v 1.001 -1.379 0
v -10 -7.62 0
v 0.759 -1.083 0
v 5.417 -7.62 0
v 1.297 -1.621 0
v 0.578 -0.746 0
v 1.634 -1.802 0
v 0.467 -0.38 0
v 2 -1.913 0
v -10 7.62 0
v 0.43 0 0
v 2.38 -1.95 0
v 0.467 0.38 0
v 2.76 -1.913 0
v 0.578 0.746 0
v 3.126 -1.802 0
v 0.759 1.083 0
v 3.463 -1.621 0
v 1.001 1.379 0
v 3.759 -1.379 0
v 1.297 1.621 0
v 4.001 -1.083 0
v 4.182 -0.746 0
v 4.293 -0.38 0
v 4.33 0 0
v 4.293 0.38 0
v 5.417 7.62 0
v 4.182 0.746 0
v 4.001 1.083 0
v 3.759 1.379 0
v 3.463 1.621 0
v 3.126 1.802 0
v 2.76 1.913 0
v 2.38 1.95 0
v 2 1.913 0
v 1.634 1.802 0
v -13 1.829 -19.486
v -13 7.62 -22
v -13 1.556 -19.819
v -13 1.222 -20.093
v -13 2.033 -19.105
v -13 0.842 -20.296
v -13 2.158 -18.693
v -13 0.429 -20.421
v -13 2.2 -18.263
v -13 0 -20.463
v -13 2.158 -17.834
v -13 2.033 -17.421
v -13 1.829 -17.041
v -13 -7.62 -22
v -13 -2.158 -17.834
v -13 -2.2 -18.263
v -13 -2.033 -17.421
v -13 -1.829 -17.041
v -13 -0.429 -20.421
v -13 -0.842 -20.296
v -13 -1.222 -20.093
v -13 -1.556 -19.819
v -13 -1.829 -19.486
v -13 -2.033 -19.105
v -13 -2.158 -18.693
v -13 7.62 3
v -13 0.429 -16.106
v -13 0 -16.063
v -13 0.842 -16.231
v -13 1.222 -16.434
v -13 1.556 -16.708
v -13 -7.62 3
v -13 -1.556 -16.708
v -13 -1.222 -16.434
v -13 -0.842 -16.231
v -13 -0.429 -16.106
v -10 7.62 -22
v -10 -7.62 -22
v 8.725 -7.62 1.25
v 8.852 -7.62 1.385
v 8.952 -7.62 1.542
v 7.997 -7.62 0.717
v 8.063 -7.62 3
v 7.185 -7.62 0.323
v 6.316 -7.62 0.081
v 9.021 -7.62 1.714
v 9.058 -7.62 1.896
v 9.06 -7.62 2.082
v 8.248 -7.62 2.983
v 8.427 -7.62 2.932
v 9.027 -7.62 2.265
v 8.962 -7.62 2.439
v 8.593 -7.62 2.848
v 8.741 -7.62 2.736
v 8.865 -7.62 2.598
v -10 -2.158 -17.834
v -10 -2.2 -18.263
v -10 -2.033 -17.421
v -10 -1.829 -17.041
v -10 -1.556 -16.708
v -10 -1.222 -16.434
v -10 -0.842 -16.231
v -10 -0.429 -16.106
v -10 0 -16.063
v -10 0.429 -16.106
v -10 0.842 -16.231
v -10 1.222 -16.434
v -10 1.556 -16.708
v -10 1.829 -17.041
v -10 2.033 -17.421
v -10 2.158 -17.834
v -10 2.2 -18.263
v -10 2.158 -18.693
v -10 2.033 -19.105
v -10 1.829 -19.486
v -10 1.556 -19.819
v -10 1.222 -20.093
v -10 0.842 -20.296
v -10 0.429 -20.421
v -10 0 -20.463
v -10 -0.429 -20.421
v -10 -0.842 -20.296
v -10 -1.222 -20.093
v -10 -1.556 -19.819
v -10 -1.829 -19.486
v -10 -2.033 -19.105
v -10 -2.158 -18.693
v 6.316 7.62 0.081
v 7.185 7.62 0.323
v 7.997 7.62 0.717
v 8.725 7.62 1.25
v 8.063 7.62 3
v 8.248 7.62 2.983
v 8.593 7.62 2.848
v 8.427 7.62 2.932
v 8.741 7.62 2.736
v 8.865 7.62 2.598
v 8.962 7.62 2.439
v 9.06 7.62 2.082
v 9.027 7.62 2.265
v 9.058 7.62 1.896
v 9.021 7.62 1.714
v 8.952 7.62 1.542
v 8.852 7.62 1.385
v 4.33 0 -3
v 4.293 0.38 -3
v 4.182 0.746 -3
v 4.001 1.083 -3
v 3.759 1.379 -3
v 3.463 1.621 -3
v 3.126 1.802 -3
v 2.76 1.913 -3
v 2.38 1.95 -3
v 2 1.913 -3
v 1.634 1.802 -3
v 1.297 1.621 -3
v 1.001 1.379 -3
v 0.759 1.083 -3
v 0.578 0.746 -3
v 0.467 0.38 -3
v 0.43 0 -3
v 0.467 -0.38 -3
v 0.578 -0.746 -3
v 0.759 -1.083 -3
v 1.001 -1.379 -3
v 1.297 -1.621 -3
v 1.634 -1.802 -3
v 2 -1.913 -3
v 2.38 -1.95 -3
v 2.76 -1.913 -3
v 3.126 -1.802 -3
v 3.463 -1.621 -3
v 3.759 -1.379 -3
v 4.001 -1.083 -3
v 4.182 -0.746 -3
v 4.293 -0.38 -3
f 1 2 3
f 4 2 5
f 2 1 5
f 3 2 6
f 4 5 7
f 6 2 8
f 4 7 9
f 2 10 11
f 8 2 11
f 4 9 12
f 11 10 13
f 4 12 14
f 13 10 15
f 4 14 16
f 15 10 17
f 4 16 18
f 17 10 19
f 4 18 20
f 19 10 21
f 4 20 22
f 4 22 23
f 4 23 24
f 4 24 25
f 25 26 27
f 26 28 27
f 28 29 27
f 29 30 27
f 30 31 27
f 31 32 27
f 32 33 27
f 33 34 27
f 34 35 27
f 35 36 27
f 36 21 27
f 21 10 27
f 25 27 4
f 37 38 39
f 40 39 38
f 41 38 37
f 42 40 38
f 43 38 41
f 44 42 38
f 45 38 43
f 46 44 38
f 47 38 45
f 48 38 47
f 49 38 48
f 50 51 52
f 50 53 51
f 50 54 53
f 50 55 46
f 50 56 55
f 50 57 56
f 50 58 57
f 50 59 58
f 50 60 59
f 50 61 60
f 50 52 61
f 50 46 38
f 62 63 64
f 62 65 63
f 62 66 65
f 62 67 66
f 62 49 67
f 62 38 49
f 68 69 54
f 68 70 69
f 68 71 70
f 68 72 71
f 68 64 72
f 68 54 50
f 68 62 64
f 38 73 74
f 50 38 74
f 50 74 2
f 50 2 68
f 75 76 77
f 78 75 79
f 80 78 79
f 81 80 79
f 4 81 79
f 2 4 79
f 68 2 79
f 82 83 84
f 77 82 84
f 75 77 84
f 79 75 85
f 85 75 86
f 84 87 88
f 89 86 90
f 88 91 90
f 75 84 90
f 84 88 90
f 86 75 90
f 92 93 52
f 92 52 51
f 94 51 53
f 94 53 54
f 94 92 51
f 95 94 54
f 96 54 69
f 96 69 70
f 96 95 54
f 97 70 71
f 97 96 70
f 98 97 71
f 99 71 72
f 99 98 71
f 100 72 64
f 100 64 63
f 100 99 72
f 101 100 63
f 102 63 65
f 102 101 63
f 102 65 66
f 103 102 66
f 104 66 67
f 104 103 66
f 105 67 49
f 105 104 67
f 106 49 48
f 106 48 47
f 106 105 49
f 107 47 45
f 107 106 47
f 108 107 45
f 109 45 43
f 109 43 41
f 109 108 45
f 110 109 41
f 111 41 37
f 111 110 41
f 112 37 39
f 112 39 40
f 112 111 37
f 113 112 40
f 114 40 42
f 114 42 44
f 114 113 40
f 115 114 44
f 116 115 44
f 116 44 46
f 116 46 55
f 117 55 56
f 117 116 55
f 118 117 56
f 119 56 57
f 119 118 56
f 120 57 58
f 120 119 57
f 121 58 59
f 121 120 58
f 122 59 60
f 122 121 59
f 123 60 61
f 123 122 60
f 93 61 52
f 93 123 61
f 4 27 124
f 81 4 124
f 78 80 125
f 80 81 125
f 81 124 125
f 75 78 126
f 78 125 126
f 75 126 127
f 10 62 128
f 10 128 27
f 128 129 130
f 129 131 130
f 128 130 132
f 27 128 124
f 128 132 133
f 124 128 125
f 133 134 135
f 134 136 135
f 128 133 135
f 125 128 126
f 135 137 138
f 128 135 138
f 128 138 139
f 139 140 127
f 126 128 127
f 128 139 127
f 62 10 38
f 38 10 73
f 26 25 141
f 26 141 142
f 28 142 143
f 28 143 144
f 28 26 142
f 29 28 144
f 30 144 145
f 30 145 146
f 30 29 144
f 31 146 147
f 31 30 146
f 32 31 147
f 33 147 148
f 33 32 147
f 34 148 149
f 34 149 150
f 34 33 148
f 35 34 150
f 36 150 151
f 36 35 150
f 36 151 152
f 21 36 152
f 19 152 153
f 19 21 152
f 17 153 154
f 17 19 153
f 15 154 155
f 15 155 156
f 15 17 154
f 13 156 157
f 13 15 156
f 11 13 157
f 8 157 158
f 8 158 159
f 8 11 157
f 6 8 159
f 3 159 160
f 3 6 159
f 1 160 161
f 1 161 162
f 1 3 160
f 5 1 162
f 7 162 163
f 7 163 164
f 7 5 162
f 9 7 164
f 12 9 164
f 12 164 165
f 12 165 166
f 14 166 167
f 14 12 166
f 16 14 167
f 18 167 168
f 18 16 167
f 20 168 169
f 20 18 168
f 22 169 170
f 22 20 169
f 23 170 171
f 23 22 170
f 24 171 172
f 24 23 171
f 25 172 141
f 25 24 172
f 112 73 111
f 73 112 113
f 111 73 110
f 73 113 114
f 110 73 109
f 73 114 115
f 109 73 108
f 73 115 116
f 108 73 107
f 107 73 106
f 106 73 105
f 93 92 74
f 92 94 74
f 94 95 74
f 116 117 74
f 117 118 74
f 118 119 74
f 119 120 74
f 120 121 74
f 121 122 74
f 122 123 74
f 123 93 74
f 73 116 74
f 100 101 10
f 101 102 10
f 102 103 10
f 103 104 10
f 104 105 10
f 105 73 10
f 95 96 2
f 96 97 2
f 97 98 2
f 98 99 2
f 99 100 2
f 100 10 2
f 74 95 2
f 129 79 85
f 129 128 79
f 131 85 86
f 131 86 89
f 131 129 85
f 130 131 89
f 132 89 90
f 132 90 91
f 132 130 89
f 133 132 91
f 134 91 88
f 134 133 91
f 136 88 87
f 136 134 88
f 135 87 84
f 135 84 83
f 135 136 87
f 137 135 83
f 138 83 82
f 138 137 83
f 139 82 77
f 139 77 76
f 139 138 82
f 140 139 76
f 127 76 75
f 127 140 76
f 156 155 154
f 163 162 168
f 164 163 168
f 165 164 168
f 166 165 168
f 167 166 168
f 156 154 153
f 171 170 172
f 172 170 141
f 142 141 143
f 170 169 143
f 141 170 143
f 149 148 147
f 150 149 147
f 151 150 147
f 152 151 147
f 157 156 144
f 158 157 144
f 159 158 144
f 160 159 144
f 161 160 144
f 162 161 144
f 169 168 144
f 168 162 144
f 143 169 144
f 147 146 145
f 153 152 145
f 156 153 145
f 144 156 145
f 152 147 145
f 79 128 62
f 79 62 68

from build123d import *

# Parameters (mm, degrees)
F0_W        = 4.76
F0_H        = 15.24
F0_W_2      = 15.24
F0_R        = 1.95
F1_DEPTH    = 3
F2_DEPTH    = 3
F3_W        = 15.24
F3_H        = 22
F3_R        = 2.2
F3_H_2      = 3
F4_DEPTH    = 3
F5_T1_DEPTH = 38.1528784748
F6_R        = 1


# Not quite as in the source:
# - a fillet or chamfer that OpenCascade refuses, or shapes differently, is made with other operations: its cross-section is extruded or revolved along the edge and cut away or added
# - a feature names something its author has since deleted; it is built from what else it names


with BuildPart() as f1:
    # F0 (on Top) → F1 (new body)
    with BuildSketch(Plane.XY):
        with Locations((-7.62, 0)):
            Rectangle(F0_W, F0_H)
        with Locations((2.38, 0)):
            Rectangle(F0_W_2, F0_H)
        with Locations((2.38, 0)):
            Circle(F0_R, mode=Mode.SUBTRACT)
        with Locations((2.38, 0)):
            Circle(F0_R)
    extrude(amount=F1_DEPTH)

    # F0 (on Top) → F2 (join)
    with BuildSketch(Plane.XY):
        with Locations((2.38, 0)):
            Circle(F0_R)
    extrude(amount=-F2_DEPTH)

    # F3 (on face) → F4 (join)
    with BuildSketch(Plane(origin=(-10, 0, 0), x_dir=(0, -1, 0), z_dir=(-1, 0, 0))):
        with Locations((0, -11)):
            Rectangle(F3_W, F3_H)
        with Locations((0, -18.2633977383)):
            Circle(F3_R, mode=Mode.SUBTRACT)
        with Locations((0, 1.5)):
            Rectangle(F3_W, F3_H_2)
    extrude(amount=F4_DEPTH)

    # F5: fillet of radius 5 on 1 edges, made by hand

    # F5_s2 → F5_t1 (cut)
    with BuildSketch(Plane.XZ.offset(-19.0764392374)):
        with BuildLine():
            ThreePointArc((5.417424305, 0), (8.1560370926, 0.8166998673), (10, 3))
            Line((10, 3), (10, 0))
            Line((10, 0), (5.417424305, 0))
        make_face()
    extrude(amount=F5_T1_DEPTH, mode=Mode.SUBTRACT)

    # F6
    f6_edges = [f1.edges().sort_by_distance(p)[0] for p in [
        (10, 0, 3),
    ]]
    fillet(f6_edges, radius=F6_R)


solid = f1.part
